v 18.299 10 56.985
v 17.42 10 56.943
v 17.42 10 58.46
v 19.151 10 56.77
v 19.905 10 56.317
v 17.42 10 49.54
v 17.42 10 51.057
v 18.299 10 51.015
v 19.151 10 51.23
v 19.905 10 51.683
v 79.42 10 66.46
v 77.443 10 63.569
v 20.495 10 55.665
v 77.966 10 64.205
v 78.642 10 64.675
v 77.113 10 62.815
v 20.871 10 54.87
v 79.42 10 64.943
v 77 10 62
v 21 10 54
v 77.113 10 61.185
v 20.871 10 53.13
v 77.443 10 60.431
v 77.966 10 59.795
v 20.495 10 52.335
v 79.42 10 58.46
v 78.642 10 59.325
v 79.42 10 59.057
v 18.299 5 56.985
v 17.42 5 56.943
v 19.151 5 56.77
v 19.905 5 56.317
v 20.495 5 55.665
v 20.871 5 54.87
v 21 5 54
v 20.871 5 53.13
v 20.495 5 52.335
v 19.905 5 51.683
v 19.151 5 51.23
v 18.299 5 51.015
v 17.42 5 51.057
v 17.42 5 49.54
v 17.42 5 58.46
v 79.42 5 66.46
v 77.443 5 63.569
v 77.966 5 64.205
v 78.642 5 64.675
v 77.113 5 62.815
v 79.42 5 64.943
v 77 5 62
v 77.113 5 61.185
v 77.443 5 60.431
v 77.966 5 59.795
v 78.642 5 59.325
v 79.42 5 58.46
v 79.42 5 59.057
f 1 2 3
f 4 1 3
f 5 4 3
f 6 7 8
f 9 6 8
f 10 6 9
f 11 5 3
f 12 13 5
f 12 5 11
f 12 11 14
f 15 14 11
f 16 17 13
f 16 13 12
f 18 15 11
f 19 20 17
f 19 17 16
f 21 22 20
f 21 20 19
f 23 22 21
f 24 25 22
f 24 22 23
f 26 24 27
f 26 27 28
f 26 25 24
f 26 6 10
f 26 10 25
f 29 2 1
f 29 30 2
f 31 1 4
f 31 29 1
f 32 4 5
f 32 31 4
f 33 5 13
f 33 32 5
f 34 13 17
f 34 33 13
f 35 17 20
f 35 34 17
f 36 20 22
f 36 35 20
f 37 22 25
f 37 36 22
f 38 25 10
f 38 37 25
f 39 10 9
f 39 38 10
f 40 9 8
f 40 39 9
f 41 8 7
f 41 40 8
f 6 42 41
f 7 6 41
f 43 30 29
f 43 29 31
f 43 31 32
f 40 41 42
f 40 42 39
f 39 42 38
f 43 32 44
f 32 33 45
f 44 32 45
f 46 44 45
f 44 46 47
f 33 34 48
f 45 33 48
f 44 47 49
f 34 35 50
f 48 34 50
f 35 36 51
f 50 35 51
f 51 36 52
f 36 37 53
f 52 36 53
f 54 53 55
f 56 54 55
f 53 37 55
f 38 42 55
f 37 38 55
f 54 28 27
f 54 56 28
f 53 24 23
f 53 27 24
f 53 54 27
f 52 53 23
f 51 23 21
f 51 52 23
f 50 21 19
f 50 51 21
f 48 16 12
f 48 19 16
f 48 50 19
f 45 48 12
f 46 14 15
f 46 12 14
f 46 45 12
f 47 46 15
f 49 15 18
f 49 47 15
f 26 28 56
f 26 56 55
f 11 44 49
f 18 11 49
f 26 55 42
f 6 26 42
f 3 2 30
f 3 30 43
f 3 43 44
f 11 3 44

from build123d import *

# Parameters (mm, degrees)
EXTRUDE_START       = 5
EXTRUDE_1_DEPTH     = 5
SKETCH_2_R          = 3
CUT_EXTRUDE_2_DEPTH = 105.040703573


with BuildPart() as part:
    # 草图1 → 凸台-拉伸1 (new body)
    with BuildSketch(Plane(origin=(0, 0, 0), x_dir=(1, 0, 0), z_dir=(0, 1, 0)).offset(EXTRUDE_START)):
        Polygon((17.42, -58.46), (79.42, -66.46), (79.42, -58.46), (17.42, -49.54), align=None)
    extrude(amount=EXTRUDE_1_DEPTH)

    # 草图2 → 切除-拉伸2 (cut, through all)
    with BuildSketch(Plane(origin=(0, 0, 0), x_dir=(1, 0, 0), z_dir=(0, 1, 0))):
        with Locations((18, -54)):
            Circle(SKETCH_2_R)
        with Locations((80, -62)):
            Circle(SKETCH_2_R)
    extrude(amount=CUT_EXTRUDE_2_DEPTH, mode=Mode.SUBTRACT)


solid = part.part
